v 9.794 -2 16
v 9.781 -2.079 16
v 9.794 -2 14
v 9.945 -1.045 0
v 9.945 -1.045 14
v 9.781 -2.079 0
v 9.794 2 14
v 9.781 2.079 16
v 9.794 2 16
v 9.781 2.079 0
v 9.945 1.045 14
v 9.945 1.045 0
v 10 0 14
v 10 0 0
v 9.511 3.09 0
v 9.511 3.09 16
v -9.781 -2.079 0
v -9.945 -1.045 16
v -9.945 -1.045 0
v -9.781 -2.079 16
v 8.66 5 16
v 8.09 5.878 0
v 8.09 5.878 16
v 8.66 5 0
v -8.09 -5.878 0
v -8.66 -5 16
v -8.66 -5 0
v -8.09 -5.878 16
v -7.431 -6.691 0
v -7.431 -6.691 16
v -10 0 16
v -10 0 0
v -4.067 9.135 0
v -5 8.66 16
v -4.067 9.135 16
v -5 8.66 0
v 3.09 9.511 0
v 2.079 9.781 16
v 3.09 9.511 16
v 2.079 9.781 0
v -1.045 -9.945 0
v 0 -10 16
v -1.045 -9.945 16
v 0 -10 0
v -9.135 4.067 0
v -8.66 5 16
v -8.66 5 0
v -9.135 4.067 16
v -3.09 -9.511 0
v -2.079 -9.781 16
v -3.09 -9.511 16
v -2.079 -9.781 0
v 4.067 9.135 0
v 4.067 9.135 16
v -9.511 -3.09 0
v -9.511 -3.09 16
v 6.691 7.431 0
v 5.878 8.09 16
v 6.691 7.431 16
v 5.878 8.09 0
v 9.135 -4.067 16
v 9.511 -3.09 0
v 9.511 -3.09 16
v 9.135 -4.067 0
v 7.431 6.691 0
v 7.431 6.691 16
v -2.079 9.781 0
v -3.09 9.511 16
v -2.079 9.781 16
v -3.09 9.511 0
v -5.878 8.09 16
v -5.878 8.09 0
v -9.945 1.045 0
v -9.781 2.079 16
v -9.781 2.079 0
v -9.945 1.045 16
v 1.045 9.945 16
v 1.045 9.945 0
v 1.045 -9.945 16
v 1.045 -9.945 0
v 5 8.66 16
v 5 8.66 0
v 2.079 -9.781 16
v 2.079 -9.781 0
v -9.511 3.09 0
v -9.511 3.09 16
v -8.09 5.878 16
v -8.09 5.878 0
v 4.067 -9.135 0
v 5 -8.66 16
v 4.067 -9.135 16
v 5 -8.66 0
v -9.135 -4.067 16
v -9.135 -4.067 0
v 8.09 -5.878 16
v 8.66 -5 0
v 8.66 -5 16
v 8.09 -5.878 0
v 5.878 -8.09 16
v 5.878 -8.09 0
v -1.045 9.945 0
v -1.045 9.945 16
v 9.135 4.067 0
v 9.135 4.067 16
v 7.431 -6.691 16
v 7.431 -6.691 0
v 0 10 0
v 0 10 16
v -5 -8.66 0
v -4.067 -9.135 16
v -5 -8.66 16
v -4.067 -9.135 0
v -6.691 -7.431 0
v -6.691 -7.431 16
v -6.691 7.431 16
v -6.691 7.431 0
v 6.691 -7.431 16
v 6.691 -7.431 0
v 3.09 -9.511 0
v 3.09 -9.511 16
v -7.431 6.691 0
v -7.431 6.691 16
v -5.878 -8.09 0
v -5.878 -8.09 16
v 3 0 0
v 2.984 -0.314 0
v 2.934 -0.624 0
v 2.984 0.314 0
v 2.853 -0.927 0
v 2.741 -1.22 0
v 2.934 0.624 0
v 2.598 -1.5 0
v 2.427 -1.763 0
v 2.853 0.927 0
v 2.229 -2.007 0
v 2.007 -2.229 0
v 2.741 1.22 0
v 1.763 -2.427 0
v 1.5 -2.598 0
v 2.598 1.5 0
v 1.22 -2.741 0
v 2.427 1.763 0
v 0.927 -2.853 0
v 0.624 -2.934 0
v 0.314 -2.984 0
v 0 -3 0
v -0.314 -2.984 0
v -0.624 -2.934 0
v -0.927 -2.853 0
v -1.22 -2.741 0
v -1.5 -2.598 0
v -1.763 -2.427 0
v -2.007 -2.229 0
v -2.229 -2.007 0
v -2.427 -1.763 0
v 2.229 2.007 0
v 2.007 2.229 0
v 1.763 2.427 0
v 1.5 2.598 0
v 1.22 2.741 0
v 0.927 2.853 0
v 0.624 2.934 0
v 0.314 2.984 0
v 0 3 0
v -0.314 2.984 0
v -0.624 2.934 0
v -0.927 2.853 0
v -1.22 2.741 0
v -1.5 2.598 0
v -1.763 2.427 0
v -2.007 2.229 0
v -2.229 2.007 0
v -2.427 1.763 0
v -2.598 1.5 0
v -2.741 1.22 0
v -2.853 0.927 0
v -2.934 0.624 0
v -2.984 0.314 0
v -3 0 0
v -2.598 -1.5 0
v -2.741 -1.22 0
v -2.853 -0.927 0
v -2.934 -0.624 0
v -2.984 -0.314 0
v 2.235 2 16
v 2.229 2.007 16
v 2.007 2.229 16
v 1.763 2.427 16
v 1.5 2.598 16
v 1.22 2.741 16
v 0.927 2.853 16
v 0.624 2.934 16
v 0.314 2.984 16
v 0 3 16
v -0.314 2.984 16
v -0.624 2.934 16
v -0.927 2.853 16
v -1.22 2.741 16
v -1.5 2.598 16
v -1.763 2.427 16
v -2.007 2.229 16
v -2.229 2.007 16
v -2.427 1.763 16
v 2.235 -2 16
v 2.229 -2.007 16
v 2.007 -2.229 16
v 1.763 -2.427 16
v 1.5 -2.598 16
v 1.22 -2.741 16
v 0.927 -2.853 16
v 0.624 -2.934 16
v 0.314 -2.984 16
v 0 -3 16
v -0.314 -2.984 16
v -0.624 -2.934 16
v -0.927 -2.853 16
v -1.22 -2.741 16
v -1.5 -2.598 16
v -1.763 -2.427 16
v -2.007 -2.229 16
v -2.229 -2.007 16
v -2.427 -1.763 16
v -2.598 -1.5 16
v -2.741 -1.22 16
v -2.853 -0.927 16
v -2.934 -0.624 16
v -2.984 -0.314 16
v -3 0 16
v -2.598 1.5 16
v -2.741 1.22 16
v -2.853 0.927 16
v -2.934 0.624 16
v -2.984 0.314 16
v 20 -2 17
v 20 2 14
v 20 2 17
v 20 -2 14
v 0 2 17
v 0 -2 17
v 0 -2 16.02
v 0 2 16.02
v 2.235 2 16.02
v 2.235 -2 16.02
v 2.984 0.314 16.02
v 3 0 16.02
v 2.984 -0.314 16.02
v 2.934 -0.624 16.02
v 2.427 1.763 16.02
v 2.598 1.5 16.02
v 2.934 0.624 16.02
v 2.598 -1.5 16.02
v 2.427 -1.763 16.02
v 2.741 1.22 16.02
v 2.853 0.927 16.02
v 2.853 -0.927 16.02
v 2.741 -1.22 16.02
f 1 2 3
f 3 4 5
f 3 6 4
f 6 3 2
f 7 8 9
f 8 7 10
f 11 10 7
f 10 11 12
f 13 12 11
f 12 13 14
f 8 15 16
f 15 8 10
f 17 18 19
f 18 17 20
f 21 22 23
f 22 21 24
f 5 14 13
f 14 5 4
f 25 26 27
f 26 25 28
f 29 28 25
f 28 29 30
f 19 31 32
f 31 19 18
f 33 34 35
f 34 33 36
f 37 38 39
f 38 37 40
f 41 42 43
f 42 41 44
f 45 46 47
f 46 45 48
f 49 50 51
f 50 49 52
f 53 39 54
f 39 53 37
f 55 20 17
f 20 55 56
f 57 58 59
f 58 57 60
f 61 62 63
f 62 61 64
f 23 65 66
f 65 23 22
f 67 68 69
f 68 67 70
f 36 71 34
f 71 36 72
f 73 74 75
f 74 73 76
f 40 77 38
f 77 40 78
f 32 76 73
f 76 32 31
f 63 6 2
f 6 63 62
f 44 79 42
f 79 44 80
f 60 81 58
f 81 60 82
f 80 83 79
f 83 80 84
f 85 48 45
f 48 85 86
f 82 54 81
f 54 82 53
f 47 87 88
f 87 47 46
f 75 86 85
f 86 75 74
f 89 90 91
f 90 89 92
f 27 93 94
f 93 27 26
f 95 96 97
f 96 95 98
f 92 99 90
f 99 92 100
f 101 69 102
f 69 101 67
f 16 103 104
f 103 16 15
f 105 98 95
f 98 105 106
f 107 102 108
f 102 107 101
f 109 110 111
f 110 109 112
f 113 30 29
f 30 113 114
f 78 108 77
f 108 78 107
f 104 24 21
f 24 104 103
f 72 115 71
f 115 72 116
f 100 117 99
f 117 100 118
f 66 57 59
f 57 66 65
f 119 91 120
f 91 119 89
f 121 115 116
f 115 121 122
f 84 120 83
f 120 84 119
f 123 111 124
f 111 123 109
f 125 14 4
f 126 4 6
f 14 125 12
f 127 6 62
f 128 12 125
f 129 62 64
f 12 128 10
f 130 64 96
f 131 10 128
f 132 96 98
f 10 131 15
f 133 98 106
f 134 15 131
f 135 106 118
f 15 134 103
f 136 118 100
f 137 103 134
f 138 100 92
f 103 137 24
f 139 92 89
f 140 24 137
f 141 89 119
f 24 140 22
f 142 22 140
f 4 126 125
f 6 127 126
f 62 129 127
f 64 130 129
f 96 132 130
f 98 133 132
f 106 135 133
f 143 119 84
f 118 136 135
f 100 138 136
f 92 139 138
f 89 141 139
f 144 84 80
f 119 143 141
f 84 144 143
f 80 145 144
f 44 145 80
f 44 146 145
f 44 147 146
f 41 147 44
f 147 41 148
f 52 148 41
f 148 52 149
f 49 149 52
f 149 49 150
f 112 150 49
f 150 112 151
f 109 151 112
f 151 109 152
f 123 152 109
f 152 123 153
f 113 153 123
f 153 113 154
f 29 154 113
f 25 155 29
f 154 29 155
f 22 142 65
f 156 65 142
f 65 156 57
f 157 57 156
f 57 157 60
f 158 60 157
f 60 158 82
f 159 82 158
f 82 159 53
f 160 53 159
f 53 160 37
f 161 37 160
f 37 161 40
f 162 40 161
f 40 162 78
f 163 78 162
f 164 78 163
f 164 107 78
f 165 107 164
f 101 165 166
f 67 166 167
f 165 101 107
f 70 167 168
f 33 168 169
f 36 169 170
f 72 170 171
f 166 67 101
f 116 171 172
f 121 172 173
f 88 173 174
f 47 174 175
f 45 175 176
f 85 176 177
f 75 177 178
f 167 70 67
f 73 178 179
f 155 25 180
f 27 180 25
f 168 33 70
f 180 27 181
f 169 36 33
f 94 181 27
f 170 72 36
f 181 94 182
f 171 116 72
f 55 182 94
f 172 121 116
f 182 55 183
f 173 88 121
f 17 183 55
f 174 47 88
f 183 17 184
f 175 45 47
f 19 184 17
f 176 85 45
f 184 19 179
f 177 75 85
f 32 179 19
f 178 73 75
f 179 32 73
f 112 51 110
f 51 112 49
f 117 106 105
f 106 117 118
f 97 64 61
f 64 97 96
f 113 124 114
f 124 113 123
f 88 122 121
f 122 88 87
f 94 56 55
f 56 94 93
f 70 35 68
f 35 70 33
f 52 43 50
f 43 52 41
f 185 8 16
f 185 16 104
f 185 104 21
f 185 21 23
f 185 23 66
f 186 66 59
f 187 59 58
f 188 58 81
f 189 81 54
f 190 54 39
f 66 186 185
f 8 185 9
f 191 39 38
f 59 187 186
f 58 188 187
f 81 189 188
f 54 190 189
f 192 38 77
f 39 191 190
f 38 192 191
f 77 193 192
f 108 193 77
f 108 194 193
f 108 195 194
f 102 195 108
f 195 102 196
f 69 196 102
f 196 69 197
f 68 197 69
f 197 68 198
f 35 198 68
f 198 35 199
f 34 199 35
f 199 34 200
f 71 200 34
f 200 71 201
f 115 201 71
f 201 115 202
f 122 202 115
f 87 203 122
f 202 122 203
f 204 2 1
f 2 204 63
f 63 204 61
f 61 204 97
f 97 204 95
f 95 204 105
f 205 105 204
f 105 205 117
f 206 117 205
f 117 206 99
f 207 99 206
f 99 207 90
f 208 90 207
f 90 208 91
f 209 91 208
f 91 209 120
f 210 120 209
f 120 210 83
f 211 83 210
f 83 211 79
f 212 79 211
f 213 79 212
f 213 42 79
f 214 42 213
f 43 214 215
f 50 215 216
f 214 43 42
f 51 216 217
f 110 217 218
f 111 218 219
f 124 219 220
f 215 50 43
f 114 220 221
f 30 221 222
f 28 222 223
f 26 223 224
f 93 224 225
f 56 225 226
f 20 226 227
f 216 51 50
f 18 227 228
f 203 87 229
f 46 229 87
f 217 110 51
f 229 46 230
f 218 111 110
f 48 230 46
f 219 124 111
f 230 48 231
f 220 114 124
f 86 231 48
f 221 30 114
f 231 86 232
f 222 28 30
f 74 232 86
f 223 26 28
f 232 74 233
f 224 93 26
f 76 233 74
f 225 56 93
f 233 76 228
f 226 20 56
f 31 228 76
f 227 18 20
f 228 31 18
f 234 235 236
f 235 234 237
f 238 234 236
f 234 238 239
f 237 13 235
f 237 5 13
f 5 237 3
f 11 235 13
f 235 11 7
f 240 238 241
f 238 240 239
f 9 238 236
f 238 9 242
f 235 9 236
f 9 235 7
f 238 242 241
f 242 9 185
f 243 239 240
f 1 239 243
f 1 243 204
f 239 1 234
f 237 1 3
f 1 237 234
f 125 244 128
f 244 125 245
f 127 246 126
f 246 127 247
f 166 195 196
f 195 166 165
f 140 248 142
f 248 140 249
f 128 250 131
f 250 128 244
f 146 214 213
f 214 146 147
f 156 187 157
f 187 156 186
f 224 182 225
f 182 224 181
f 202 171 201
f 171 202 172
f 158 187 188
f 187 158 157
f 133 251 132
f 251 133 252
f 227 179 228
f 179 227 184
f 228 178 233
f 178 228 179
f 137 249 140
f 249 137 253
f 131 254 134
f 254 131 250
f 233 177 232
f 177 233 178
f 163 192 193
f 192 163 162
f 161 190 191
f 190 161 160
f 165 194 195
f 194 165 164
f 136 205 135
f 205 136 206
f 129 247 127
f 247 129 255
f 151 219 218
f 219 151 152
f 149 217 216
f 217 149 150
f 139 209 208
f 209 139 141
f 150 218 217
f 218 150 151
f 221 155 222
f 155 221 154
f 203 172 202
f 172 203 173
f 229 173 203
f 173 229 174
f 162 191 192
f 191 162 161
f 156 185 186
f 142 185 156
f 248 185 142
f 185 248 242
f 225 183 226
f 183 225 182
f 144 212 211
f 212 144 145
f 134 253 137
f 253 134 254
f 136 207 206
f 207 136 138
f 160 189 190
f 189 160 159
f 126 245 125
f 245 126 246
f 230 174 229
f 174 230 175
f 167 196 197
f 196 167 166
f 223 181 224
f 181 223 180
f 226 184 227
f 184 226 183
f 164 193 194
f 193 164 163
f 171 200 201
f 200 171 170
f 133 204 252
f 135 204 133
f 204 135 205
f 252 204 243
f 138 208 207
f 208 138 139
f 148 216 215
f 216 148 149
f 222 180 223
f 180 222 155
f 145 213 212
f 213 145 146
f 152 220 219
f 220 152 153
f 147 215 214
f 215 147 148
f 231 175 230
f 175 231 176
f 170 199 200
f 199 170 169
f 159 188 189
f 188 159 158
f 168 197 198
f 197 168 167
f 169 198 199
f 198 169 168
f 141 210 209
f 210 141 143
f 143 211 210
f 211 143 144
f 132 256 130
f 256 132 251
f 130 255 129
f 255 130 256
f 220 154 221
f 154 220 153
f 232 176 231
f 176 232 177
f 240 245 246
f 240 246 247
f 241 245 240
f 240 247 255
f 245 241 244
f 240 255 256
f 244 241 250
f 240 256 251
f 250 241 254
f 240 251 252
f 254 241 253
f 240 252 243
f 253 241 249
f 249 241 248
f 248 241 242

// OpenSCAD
// Quarter-turn cam lock.
$fn = 60;
eps = 0.02;
body_d = 20;
body_l = 16;
arm_l = 20;
difference() { union() { cylinder(d=body_d,h=body_l); translate([0,-2,body_l-2]) cube([arm_l,4,3]); } translate([0,0,-eps]) cylinder(d=6,h=body_l+2*eps); }
